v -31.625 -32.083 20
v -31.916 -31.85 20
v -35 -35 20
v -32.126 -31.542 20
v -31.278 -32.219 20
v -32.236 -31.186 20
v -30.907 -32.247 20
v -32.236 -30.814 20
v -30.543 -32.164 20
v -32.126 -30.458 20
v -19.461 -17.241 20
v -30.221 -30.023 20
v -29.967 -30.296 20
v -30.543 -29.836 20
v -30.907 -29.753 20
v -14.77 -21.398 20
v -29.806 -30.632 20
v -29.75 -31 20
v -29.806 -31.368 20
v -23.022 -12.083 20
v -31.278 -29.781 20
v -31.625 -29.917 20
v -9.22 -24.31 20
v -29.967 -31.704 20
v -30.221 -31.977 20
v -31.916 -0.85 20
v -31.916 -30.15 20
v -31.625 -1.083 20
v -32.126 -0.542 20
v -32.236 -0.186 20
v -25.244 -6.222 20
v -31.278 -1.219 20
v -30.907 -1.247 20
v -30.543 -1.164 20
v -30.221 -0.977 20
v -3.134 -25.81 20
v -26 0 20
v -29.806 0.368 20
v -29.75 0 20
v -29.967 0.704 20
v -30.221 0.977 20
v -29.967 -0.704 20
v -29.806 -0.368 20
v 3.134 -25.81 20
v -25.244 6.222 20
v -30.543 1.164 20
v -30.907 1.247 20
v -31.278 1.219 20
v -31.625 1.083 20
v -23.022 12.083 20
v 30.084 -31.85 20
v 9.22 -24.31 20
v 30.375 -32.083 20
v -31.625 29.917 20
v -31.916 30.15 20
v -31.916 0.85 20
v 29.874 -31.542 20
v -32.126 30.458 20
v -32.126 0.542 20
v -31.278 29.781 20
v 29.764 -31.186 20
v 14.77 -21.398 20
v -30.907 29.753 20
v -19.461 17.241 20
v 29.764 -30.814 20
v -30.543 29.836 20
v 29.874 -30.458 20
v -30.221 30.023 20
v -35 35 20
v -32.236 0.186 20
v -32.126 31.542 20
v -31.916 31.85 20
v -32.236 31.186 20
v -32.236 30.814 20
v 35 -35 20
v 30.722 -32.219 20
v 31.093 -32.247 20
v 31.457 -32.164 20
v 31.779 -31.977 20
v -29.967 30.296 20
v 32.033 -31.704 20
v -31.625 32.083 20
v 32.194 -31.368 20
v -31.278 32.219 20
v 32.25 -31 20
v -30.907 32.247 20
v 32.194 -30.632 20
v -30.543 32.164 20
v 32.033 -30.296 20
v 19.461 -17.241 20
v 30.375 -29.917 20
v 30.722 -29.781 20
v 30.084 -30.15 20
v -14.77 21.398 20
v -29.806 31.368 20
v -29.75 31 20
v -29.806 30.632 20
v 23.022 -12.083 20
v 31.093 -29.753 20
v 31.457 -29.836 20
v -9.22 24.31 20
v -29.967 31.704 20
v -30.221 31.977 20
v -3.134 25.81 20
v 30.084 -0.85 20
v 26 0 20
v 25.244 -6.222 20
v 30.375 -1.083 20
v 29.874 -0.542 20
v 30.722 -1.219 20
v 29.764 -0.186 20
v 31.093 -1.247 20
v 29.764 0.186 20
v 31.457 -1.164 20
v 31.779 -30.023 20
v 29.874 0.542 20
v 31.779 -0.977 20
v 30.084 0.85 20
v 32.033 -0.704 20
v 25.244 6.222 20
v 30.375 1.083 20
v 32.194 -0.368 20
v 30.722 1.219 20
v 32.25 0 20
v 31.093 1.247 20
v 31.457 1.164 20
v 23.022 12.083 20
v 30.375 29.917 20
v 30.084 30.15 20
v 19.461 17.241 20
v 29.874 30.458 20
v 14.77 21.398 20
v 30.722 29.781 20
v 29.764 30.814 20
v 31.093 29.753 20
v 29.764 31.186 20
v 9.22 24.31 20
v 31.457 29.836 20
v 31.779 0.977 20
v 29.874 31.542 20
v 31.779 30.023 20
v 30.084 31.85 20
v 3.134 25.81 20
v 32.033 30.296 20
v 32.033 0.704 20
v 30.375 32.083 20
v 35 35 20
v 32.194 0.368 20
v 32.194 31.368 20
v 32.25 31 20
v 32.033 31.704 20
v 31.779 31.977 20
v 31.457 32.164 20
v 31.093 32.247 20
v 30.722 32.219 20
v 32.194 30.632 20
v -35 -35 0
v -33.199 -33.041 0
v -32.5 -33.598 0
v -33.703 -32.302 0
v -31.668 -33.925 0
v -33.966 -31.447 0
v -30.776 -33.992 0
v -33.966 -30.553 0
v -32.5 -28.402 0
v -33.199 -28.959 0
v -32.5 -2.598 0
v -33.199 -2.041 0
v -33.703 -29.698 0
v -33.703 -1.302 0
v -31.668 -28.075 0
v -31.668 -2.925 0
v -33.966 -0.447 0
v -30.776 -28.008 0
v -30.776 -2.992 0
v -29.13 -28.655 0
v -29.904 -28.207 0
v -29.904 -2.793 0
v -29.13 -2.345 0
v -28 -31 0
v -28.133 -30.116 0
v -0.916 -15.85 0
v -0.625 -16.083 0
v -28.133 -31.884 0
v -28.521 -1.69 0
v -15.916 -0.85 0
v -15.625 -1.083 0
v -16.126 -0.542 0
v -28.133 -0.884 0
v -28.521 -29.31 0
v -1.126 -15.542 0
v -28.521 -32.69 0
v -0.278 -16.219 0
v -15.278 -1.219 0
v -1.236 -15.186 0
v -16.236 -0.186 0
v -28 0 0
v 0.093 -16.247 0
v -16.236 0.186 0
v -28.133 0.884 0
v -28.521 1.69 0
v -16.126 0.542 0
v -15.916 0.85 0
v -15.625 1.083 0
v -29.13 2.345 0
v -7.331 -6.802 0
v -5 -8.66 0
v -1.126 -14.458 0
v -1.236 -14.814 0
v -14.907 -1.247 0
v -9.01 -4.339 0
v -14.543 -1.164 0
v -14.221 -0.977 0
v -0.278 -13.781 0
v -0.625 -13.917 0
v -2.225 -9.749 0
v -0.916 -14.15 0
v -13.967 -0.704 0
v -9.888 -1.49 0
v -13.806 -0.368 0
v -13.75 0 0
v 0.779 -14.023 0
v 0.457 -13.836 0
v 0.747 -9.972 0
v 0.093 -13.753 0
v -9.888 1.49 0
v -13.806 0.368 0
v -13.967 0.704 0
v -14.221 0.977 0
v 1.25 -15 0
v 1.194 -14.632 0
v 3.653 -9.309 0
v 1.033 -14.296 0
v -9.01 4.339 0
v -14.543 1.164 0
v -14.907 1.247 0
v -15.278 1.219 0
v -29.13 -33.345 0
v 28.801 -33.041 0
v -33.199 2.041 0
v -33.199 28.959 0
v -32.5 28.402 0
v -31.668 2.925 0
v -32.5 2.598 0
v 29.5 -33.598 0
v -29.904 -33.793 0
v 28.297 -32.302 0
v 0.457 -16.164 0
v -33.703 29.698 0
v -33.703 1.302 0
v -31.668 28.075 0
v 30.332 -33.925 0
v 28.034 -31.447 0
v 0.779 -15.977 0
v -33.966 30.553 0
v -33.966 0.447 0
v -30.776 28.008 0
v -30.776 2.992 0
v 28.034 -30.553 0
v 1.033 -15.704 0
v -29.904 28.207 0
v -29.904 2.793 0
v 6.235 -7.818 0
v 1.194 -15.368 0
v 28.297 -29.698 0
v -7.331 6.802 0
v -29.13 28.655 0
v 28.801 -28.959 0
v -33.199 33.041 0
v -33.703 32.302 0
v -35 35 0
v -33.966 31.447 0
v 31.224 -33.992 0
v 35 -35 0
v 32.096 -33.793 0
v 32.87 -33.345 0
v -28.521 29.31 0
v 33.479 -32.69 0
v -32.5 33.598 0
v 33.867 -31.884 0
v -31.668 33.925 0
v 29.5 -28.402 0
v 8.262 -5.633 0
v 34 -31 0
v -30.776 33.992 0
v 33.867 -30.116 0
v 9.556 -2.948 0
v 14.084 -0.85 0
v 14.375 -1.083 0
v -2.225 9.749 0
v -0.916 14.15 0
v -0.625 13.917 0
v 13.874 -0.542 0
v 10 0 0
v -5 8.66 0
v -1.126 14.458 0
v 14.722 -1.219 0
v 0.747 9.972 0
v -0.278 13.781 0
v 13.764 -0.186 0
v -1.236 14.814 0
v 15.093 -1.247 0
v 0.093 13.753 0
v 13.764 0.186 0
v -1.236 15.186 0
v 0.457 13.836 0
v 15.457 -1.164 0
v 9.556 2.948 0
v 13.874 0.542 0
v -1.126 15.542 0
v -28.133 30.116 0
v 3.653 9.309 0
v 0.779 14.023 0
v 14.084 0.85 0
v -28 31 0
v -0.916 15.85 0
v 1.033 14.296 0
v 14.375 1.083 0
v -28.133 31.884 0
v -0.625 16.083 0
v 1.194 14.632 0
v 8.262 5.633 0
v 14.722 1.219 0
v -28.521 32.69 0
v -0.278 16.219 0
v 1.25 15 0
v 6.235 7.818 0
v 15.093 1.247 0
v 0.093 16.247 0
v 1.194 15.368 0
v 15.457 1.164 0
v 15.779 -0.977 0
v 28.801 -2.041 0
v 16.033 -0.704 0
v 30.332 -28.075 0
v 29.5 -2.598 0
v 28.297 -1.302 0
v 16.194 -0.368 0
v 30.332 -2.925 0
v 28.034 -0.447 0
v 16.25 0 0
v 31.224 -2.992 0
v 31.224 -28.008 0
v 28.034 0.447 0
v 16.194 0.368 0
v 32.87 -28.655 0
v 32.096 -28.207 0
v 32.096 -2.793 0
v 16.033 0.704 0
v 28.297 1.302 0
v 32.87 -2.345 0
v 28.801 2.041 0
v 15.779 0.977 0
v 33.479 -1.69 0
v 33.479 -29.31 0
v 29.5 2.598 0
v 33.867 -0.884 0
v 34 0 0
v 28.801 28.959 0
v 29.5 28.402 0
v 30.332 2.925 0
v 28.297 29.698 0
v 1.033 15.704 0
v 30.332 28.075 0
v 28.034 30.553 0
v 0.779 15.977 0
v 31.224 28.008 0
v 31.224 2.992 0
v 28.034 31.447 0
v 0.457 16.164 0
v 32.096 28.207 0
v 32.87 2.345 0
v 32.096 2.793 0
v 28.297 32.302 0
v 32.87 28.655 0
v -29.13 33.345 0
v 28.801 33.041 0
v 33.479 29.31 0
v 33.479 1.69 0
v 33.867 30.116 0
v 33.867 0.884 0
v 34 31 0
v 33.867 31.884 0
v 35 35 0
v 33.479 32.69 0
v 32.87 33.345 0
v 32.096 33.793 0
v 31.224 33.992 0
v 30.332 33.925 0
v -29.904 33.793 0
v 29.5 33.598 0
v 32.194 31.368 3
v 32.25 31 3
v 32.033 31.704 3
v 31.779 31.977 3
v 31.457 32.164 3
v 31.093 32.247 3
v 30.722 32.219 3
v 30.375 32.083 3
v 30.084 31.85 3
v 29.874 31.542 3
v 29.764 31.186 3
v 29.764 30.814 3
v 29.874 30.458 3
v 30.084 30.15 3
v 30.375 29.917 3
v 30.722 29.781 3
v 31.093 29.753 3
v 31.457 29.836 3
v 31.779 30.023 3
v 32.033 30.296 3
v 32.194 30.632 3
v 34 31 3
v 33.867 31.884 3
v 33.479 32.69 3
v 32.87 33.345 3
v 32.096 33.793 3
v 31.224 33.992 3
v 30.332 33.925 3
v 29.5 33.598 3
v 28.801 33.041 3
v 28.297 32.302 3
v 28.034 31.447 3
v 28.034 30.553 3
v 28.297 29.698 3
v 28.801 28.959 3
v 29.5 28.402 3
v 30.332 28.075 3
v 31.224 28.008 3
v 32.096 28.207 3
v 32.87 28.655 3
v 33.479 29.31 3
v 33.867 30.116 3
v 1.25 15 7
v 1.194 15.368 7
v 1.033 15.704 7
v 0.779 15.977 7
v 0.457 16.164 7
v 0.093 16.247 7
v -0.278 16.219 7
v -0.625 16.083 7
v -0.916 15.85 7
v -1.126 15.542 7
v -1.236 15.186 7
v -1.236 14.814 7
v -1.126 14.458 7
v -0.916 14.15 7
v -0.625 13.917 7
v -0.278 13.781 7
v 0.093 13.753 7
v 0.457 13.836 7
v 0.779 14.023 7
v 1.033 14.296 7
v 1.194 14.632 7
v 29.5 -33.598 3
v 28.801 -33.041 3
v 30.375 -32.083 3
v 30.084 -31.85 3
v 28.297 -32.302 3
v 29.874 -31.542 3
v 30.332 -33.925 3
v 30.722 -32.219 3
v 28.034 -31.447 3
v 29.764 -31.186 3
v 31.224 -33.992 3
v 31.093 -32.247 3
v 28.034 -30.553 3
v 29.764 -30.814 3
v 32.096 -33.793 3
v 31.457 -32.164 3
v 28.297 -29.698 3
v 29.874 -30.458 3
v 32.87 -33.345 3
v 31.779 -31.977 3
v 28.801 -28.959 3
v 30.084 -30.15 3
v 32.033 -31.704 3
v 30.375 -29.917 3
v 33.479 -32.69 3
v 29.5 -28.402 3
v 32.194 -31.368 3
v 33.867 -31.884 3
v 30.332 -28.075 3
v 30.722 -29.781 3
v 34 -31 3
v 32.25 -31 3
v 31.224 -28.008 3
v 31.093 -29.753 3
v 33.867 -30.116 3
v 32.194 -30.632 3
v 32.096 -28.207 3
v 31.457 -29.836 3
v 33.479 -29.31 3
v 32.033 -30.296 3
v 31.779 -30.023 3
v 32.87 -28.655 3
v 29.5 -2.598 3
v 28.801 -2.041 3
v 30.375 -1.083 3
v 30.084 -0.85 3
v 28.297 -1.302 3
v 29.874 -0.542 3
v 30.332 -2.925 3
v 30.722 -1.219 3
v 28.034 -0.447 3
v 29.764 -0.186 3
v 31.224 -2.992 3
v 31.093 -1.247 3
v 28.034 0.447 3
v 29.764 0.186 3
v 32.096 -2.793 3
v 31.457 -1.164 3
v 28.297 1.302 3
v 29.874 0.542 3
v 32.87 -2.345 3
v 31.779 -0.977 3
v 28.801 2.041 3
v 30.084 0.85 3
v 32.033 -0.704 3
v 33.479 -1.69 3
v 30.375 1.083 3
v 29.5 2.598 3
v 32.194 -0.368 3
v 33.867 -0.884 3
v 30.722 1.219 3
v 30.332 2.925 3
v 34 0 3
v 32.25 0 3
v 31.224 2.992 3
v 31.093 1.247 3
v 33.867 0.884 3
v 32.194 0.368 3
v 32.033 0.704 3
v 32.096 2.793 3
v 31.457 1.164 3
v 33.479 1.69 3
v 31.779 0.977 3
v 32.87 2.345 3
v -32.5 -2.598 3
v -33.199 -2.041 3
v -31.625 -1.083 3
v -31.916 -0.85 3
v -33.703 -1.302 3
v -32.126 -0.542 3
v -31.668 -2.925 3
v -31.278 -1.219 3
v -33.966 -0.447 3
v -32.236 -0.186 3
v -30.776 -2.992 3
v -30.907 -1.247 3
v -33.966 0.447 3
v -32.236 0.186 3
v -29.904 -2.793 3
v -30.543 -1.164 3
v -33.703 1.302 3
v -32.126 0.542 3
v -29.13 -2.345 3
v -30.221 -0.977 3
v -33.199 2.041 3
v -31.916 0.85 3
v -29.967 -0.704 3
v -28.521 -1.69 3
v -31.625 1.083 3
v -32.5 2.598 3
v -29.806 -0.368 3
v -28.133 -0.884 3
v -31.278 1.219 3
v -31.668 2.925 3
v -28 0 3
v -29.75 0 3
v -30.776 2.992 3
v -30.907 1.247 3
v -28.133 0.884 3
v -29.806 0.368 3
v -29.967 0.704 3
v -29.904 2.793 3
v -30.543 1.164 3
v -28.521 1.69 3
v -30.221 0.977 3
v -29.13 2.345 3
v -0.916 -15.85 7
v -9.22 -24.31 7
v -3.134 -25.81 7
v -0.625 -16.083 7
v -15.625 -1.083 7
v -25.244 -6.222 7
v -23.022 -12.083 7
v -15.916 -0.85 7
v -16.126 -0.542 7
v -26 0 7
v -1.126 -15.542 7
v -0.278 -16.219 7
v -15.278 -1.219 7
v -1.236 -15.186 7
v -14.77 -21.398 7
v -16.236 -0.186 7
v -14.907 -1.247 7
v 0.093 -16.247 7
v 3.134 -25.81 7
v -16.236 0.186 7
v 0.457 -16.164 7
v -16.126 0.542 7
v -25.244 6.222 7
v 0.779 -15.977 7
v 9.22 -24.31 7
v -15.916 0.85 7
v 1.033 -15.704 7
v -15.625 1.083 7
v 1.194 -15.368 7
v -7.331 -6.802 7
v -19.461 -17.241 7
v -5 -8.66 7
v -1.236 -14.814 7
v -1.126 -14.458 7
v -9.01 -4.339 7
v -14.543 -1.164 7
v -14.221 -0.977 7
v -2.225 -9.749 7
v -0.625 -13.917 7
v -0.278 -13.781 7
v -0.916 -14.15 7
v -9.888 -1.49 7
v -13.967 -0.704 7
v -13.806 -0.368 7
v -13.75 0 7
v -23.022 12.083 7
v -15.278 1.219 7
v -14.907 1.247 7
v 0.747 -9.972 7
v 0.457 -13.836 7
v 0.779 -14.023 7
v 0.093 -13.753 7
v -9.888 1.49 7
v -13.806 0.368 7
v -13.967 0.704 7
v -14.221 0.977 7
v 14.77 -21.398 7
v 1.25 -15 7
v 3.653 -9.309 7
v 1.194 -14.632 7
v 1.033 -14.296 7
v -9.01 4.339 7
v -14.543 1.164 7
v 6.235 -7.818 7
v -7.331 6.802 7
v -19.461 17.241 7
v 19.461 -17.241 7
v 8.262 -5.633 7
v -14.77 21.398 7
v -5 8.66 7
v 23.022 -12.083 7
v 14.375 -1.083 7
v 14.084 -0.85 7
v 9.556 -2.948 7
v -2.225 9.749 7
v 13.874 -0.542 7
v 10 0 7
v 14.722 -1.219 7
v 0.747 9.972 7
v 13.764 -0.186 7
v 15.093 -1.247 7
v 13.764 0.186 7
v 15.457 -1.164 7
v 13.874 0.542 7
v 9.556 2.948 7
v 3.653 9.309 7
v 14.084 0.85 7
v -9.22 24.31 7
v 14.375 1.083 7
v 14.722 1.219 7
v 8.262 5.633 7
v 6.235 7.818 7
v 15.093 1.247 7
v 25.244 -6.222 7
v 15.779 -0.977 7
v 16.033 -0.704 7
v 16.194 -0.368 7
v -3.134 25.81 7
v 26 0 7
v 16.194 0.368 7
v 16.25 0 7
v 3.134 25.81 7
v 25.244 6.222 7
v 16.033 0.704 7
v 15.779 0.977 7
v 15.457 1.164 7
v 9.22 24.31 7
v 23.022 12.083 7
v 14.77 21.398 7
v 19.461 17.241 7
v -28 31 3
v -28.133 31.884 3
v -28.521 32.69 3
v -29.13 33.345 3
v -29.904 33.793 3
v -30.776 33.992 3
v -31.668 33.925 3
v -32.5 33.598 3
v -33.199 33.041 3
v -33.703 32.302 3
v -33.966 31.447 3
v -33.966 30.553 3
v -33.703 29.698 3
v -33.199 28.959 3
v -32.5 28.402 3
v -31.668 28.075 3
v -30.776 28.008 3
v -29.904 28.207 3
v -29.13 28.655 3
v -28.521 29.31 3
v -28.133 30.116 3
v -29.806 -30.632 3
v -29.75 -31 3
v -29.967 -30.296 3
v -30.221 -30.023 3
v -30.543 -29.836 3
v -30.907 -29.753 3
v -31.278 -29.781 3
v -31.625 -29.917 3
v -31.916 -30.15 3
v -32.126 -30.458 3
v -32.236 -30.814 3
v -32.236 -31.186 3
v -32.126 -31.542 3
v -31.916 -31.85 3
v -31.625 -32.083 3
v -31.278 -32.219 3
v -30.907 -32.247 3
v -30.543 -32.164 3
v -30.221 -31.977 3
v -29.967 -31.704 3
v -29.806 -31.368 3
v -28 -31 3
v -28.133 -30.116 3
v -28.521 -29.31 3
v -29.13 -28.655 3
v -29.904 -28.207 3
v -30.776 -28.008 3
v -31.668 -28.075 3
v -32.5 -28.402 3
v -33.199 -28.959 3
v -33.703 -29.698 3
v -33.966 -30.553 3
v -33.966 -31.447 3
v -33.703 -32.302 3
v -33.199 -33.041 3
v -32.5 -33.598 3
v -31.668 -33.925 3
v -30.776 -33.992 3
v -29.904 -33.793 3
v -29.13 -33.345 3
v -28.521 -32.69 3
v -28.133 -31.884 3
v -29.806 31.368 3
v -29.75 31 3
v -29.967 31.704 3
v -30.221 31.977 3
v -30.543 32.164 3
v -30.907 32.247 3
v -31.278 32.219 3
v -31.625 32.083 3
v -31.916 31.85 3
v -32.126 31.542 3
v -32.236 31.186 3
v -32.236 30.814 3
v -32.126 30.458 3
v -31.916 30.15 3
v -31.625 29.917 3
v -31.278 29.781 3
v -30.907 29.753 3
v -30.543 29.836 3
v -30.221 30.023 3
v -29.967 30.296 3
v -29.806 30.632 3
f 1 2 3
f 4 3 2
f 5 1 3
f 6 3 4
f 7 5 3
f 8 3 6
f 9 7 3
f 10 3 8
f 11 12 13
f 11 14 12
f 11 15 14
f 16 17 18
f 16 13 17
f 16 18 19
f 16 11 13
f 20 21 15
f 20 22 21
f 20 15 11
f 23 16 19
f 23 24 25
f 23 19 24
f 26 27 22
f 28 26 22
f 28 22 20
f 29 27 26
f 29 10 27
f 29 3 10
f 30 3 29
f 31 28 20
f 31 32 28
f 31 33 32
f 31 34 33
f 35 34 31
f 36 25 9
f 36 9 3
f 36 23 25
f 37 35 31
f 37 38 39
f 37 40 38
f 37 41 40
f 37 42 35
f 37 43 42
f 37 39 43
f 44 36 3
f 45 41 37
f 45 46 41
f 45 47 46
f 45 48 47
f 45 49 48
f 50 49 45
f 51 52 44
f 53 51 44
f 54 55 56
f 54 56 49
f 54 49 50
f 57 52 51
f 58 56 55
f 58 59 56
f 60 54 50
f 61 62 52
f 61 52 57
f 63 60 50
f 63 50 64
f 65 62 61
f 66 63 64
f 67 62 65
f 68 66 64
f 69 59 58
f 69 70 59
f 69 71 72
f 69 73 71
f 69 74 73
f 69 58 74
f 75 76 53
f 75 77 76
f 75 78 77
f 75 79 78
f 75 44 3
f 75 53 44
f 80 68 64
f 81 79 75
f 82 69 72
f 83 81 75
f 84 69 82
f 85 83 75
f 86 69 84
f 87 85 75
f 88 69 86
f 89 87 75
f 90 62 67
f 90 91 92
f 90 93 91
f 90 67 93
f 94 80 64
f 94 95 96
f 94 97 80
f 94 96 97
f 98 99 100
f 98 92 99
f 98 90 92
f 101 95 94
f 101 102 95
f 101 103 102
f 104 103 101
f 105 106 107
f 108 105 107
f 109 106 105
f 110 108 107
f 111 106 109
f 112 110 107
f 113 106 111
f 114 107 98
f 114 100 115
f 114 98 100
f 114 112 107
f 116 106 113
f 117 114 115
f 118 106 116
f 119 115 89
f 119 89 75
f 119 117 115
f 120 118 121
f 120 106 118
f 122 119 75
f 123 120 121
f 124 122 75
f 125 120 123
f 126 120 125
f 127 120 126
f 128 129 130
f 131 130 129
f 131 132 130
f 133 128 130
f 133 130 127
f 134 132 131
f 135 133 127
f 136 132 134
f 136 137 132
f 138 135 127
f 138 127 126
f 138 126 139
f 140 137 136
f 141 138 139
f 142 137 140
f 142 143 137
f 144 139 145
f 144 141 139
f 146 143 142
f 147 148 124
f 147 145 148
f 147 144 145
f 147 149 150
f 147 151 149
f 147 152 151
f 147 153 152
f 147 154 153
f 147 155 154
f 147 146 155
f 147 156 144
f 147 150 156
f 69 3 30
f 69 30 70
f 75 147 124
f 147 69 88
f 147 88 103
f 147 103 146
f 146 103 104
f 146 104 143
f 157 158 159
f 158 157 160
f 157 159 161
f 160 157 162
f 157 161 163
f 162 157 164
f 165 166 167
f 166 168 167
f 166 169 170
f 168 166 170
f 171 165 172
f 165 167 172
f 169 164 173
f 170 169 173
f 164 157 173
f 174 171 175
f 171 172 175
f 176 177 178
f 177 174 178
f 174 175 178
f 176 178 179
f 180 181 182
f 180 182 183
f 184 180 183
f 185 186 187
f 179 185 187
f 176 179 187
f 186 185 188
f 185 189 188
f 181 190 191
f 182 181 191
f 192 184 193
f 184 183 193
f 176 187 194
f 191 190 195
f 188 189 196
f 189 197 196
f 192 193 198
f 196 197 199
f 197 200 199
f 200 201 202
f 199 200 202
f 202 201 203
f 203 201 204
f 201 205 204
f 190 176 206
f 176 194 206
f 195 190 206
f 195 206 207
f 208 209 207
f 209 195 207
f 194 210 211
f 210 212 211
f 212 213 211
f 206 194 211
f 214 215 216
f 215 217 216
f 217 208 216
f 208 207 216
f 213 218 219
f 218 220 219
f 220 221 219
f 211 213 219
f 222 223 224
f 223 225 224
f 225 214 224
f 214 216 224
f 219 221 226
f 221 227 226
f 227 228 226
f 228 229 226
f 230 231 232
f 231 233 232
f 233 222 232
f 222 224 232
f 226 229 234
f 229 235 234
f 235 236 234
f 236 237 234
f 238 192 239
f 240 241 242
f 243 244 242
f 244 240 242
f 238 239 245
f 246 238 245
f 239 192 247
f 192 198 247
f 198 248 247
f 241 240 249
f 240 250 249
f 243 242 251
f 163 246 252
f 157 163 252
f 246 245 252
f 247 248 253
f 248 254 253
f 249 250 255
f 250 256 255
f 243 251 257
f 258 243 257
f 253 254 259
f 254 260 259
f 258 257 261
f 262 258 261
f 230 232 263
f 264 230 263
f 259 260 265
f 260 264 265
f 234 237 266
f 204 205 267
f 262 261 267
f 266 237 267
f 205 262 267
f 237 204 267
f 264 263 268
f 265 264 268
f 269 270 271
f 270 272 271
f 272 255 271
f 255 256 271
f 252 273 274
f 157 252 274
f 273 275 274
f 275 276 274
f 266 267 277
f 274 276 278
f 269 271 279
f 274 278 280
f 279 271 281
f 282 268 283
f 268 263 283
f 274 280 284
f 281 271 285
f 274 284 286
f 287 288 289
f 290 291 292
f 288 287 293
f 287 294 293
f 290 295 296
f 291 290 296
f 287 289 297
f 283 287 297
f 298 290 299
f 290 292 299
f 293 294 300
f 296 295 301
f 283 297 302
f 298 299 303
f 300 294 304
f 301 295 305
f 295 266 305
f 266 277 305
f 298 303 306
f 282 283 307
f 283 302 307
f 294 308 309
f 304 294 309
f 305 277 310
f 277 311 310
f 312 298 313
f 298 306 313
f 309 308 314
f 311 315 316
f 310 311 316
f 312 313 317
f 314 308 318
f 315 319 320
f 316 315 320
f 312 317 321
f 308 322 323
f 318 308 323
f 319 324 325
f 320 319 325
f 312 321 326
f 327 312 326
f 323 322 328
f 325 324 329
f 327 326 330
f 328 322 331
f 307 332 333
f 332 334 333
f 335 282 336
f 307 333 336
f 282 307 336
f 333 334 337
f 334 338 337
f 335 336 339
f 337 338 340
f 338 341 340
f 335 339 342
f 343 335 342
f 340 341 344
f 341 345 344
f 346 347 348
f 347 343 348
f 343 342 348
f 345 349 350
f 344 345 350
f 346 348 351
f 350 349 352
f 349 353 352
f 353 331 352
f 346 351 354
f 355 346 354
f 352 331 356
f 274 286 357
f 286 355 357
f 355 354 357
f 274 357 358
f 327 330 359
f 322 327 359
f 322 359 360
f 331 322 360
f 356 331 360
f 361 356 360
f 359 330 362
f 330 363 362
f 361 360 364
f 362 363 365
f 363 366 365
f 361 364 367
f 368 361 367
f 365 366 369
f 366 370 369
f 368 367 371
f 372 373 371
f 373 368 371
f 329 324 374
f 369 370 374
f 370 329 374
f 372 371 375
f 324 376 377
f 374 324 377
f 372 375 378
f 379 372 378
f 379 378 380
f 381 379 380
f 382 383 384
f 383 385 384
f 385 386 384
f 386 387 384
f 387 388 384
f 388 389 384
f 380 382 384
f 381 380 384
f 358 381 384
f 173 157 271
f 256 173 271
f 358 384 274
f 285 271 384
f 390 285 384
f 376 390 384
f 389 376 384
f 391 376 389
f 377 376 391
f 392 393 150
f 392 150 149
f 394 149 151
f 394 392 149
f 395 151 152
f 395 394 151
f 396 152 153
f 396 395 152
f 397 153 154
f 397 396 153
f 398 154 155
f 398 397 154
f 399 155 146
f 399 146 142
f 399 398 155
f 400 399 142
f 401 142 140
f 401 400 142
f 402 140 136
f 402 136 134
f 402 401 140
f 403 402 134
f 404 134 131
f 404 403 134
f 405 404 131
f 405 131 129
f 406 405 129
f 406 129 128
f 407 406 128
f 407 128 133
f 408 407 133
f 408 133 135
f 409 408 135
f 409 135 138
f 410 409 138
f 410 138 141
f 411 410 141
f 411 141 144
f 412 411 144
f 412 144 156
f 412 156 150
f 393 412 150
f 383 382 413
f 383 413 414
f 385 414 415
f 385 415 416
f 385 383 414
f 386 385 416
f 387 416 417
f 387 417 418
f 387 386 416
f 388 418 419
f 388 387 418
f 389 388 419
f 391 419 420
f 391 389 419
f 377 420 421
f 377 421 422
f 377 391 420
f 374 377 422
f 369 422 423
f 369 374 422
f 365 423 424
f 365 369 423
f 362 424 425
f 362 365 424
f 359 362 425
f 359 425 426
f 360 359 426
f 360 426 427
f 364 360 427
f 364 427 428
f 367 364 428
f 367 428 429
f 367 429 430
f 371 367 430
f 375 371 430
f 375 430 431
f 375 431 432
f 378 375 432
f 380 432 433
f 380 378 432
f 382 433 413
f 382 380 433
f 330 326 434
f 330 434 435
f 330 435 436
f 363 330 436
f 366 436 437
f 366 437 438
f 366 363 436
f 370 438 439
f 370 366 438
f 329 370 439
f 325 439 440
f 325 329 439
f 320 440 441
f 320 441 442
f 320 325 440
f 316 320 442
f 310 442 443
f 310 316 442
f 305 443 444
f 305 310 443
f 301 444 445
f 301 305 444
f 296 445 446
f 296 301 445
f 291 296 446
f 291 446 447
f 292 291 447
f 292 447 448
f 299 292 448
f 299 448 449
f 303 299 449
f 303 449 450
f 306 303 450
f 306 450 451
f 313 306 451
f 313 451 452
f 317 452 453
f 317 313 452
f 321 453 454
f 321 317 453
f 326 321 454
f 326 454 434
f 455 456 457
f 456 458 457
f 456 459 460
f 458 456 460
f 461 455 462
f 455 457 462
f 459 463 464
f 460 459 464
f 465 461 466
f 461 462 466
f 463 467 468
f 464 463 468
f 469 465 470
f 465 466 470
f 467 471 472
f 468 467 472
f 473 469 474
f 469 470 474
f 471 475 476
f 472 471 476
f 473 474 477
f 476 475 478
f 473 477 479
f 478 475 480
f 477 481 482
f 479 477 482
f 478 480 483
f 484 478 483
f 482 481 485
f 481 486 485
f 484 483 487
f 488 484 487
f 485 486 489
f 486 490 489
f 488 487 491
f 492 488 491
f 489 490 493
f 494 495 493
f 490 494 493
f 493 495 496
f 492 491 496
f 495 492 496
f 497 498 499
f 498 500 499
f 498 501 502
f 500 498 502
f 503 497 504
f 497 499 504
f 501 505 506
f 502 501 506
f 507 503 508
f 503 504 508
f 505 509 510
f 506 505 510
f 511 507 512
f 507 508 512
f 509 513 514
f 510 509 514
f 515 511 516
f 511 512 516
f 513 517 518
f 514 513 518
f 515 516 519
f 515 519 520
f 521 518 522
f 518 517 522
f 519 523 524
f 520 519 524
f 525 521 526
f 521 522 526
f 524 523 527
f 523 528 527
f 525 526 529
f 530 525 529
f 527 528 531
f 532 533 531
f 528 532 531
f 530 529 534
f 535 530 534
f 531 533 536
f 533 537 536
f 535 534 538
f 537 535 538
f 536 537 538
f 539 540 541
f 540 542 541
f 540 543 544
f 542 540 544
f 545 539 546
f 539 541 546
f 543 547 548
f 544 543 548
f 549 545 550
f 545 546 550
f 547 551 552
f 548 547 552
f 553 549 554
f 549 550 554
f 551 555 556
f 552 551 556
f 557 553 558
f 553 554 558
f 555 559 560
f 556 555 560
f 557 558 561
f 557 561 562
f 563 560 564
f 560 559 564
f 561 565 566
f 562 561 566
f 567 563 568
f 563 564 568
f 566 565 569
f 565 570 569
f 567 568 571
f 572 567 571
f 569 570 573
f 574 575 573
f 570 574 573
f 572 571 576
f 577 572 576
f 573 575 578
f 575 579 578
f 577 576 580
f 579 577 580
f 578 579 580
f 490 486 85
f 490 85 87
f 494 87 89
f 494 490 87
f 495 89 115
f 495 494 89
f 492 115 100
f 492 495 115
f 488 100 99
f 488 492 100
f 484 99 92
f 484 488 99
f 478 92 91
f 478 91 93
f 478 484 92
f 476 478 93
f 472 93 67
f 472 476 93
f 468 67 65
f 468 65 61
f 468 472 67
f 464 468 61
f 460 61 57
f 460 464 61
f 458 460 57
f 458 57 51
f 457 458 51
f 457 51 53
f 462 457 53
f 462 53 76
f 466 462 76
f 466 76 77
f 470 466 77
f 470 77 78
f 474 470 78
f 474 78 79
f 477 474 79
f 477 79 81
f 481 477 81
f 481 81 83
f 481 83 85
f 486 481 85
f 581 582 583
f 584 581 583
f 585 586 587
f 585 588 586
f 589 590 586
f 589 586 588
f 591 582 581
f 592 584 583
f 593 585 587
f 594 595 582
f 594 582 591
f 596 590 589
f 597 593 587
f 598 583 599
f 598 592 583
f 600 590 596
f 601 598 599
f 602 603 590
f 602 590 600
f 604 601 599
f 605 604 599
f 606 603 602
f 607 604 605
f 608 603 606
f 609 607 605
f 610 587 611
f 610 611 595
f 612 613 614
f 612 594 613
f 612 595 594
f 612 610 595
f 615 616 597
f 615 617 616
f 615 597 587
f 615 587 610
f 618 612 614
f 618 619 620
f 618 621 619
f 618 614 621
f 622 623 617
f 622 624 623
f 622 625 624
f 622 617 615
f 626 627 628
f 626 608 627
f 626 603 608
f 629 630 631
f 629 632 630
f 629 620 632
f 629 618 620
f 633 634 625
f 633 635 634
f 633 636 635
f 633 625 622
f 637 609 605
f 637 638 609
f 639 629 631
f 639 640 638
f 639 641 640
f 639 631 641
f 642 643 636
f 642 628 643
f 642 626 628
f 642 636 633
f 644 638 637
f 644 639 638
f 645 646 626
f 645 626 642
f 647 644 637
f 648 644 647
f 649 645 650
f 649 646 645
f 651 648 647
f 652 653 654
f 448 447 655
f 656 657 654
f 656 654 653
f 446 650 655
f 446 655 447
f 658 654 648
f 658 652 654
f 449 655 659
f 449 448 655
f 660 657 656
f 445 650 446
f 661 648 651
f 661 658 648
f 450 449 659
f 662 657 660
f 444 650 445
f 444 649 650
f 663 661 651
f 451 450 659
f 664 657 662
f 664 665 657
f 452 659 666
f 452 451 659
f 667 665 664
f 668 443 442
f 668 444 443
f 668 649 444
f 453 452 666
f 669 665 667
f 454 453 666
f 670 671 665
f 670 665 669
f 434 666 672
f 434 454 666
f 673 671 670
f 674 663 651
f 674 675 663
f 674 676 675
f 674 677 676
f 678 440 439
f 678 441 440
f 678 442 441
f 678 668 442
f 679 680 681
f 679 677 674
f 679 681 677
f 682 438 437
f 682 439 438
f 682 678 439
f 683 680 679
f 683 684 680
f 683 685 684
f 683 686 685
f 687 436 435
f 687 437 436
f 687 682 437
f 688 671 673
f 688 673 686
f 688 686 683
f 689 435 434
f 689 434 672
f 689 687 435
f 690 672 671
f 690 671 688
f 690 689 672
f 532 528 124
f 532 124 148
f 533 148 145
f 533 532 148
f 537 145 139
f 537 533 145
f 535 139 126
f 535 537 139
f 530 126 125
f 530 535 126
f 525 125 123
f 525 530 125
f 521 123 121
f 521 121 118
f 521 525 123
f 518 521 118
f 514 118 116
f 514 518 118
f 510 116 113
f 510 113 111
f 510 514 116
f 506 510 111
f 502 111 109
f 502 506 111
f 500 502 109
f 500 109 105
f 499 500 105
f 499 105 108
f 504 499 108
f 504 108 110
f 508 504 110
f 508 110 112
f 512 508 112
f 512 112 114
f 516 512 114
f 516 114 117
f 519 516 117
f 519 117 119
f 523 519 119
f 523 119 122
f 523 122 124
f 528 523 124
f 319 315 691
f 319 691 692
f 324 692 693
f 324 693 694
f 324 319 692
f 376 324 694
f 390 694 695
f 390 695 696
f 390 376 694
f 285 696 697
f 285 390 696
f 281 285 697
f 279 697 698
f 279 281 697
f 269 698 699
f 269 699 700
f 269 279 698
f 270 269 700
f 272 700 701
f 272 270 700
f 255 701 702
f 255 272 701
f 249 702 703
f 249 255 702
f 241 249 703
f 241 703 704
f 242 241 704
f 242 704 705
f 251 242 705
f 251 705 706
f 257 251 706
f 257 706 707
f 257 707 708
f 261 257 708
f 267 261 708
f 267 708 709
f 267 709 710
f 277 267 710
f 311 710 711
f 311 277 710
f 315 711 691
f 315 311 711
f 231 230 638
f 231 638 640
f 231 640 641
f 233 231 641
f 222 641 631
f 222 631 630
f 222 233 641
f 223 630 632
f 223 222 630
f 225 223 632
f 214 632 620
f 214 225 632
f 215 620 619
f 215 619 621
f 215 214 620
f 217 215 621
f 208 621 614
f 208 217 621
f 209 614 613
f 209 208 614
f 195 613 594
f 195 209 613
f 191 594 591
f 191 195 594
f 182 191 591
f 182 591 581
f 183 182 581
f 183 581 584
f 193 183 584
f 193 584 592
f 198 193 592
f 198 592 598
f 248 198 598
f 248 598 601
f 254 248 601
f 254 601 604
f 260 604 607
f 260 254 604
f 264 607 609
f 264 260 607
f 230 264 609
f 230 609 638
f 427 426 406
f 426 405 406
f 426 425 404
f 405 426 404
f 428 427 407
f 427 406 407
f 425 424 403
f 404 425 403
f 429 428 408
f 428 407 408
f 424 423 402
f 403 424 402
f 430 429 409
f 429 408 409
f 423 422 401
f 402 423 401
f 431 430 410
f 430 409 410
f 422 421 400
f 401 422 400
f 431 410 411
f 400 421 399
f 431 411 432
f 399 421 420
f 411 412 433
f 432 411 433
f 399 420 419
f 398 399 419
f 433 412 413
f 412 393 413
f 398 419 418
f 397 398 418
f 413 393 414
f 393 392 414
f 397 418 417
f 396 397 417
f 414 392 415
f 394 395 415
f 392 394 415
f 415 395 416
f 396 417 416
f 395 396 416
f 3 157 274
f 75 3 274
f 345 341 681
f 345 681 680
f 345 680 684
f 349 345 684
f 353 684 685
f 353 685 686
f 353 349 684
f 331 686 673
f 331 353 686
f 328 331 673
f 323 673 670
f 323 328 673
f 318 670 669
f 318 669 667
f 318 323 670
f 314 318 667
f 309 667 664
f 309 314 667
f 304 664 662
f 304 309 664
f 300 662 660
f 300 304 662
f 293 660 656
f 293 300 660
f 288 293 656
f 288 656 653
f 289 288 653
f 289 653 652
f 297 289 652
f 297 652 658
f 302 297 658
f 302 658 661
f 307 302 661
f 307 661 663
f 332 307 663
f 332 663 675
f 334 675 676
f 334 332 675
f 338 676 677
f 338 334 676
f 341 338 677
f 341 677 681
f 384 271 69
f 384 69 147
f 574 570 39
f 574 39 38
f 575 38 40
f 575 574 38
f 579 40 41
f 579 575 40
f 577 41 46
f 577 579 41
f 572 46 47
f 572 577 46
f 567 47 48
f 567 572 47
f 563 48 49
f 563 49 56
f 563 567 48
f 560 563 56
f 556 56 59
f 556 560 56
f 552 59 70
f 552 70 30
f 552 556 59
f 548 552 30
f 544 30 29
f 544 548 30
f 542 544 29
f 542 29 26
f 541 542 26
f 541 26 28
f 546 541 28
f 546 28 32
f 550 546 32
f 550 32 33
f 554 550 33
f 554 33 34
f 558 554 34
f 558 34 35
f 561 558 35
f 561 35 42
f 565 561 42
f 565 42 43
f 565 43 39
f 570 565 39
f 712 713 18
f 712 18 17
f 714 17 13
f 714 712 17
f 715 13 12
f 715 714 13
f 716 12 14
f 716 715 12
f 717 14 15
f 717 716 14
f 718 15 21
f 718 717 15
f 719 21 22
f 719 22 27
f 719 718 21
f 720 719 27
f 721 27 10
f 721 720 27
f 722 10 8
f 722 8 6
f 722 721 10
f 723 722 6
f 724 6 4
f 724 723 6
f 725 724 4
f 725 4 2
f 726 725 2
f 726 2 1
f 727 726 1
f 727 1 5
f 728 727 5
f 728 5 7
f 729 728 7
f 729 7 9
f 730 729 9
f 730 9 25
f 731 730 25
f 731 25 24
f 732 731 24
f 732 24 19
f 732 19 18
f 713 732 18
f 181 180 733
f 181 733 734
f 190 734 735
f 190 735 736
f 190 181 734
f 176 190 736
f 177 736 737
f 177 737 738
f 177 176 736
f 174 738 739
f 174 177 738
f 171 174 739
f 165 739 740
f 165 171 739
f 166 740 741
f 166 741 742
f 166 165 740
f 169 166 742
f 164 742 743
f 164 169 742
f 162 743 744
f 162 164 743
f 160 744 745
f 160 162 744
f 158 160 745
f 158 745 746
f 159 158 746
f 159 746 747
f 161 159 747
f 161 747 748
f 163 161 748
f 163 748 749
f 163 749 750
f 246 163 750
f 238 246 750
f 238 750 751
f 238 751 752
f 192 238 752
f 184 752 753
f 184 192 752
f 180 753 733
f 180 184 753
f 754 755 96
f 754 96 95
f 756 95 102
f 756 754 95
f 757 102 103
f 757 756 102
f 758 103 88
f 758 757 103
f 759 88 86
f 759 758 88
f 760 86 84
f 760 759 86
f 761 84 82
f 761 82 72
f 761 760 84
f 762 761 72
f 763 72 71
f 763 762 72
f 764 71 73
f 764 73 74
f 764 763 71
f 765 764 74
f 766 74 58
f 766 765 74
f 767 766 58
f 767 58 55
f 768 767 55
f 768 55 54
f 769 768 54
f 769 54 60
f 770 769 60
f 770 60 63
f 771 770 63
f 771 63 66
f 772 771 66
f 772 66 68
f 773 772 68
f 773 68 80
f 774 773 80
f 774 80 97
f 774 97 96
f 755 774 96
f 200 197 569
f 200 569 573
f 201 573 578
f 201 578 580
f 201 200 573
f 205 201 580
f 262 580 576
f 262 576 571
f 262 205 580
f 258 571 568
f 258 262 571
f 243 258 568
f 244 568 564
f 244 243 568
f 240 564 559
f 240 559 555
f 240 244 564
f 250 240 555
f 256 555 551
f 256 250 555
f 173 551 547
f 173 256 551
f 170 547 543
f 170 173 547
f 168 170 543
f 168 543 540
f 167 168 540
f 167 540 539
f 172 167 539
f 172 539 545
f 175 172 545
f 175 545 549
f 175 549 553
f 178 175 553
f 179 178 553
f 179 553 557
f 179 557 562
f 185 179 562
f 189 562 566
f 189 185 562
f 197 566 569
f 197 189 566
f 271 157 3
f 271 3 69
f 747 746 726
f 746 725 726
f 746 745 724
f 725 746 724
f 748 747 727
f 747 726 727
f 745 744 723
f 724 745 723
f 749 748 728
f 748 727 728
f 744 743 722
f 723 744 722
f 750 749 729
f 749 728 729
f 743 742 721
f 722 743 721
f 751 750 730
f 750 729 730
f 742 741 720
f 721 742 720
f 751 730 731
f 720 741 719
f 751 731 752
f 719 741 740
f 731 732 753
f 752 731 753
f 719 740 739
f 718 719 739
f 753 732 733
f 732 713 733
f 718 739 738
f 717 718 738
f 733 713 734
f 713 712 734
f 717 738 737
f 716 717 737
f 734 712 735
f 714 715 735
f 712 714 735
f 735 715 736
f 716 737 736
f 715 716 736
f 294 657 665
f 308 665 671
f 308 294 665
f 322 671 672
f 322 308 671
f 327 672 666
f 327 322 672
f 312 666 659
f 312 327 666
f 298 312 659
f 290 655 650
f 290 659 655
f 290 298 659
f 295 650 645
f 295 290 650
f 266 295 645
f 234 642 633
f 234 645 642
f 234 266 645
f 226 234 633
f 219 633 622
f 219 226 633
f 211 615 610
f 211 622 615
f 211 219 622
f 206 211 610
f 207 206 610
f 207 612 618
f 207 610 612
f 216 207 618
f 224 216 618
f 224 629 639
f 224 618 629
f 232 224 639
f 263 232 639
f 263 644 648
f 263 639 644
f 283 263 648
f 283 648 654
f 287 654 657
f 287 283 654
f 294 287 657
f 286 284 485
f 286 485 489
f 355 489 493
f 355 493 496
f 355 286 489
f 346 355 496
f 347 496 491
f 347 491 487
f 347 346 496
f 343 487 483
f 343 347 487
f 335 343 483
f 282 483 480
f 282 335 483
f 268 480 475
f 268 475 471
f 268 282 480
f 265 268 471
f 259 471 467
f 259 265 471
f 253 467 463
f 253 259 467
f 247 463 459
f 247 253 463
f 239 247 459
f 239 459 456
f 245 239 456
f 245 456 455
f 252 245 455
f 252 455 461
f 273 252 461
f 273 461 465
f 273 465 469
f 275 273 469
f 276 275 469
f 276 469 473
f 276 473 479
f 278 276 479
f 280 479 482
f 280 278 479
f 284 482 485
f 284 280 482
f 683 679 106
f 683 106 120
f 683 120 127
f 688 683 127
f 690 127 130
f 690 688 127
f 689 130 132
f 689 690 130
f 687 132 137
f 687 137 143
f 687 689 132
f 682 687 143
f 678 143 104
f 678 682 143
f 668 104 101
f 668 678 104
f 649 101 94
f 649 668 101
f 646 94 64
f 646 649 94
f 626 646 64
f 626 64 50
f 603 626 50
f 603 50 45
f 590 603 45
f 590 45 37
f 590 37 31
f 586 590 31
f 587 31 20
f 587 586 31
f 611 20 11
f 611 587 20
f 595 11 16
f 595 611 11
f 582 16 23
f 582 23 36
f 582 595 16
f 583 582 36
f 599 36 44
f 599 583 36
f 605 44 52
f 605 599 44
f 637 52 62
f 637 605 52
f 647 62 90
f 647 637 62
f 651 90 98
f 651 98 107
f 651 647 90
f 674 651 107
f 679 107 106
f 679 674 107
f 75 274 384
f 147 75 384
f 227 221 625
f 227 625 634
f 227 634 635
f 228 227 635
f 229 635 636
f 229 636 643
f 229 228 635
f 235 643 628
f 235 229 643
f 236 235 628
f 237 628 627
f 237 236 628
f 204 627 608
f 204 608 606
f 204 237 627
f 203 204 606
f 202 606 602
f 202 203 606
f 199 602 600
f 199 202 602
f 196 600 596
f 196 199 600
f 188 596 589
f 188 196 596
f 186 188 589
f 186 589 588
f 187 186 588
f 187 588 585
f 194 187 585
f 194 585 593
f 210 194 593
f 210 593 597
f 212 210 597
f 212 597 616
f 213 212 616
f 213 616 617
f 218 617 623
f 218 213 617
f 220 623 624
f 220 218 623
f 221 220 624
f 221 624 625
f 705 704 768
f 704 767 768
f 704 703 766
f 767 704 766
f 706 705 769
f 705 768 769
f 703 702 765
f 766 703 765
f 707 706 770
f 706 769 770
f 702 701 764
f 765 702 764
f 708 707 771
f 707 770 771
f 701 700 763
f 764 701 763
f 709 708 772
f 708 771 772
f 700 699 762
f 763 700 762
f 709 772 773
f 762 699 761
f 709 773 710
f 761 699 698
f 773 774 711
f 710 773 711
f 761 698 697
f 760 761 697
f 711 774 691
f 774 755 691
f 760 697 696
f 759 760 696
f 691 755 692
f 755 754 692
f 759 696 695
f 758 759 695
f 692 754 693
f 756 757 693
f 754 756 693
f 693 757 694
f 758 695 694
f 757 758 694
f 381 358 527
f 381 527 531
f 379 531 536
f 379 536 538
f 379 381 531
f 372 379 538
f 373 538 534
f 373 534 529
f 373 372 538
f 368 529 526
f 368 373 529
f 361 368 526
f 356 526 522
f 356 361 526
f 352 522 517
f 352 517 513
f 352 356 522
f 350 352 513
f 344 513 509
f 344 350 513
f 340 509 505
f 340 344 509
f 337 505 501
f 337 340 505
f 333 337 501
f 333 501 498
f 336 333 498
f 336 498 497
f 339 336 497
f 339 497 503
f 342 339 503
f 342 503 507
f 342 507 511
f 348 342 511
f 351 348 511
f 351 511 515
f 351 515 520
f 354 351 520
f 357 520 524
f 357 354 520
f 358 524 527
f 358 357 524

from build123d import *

# Parameters (mm, degrees)
CYLINDER009_R     = 1.25
CYLINDER009_DEPTH = 20
CYLINDER010_R     = 1.25
CYLINDER010_DEPTH = 20
CYLINDER008_R     = 1.25
CYLINDER008_DEPTH = 20
CYLINDER011_R     = 1.25
CYLINDER011_DEPTH = 20
CYLINDER007_R     = 1.25
CYLINDER007_DEPTH = 20
CYLINDER006_R     = 1.25
CYLINDER006_DEPTH = 20
CYLINDER013_R     = 3
CYLINDER013_DEPTH = 3
CYLINDER017_R     = 3
CYLINDER017_DEPTH = 3
CYLINDER014_R     = 3
CYLINDER014_DEPTH = 3
CYLINDER015_R     = 3
CYLINDER015_DEPTH = 3
CYLINDER016_R     = 3
CYLINDER016_DEPTH = 3
CYLINDER012_R     = 3
CYLINDER012_DEPTH = 3
CYLINDER003_R     = 1.25
CYLINDER003_DEPTH = 7
CYLINDER005_R     = 1.25
CYLINDER005_DEPTH = 7
CYLINDER004_R     = 1.25
CYLINDER004_DEPTH = 7
CYLINDER002_R     = 1.25
CYLINDER002_DEPTH = 7
CYLINDER001_R     = 26
CYLINDER001_DEPTH = 13
CYLINDER_R        = 10
CYLINDER_DEPTH    = 20
BOX_W             = 70
BOX_H             = 70
BOX_DEPTH         = 20


with BuildPart() as zylinder009:
    # Cylinder009 → Cylinder009 (new body)
    with BuildSketch(Plane(origin=(-31, 31, 0), x_dir=(1, 0, 0), z_dir=(0, 0, 1))):
        Circle(CYLINDER009_R)
    extrude(amount=CYLINDER009_DEPTH)


with BuildPart() as zylinder010:
    # Cylinder010 → Cylinder010 (new body)
    with BuildSketch(Plane(origin=(-31, -31, 0), x_dir=(1, 0, 0), z_dir=(0, 0, 1))):
        Circle(CYLINDER010_R)
    extrude(amount=CYLINDER010_DEPTH)


with BuildPart() as zylinder008:
    # Cylinder008 → Cylinder008 (new body)
    with BuildSketch(Plane(origin=(31, -31, 0), x_dir=(1, 0, 0), z_dir=(0, 0, 1))):
        Circle(CYLINDER008_R)
    extrude(amount=CYLINDER008_DEPTH)


with BuildPart() as zylinder011:
    # Cylinder011 → Cylinder011 (new body)
    with BuildSketch(Plane(origin=(-31, 0, 0), x_dir=(1, 0, 0), z_dir=(0, 0, 1))):
        Circle(CYLINDER011_R)
    extrude(amount=CYLINDER011_DEPTH)


with BuildPart() as zylinder007:
    # Cylinder007 → Cylinder007 (new body)
    with BuildSketch(Plane(origin=(31, 0, 0), x_dir=(1, 0, 0), z_dir=(0, 0, 1))):
        Circle(CYLINDER007_R)
    extrude(amount=CYLINDER007_DEPTH)


with BuildPart() as fusion002:
    # Cylinder006 → Cylinder006 (new body)
    with BuildSketch(Plane(origin=(31, 31, 0), x_dir=(1, 0, 0), z_dir=(0, 0, 1))):
        Circle(CYLINDER006_R)
    extrude(amount=CYLINDER006_DEPTH)

    # Fusion002: union Zylinder009, Zylinder010, Zylinder008, Zylinder011, Zylinder007
    add(zylinder009.part)
    add(zylinder010.part)
    add(zylinder008.part)
    add(zylinder011.part)
    add(zylinder007.part)


with BuildPart() as zylinder013:
    # Cylinder013 → Cylinder013 (new body)
    with BuildSketch(Plane(origin=(-31, 31, 0), x_dir=(1, 0, 0), z_dir=(0, 0, 1))):
        Circle(CYLINDER013_R)
    extrude(amount=CYLINDER013_DEPTH)


with BuildPart() as zylinder017:
    # Cylinder017 → Cylinder017 (new body)
    with BuildSketch(Plane(origin=(-31, 0, 0), x_dir=(1, 0, 0), z_dir=(0, 0, 1))):
        Circle(CYLINDER017_R)
    extrude(amount=CYLINDER017_DEPTH)


with BuildPart() as zylinder014:
    # Cylinder014 → Cylinder014 (new body)
    with BuildSketch(Plane(origin=(-31, -31, 0), x_dir=(1, 0, 0), z_dir=(0, 0, 1))):
        Circle(CYLINDER014_R)
    extrude(amount=CYLINDER014_DEPTH)


with BuildPart() as zylinder015:
    # Cylinder015 → Cylinder015 (new body)
    with BuildSketch(Plane(origin=(31, -31, 0), x_dir=(1, 0, 0), z_dir=(0, 0, 1))):
        Circle(CYLINDER015_R)
    extrude(amount=CYLINDER015_DEPTH)


with BuildPart() as zylinder016:
    # Cylinder016 → Cylinder016 (new body)
    with BuildSketch(Plane(origin=(31, 0, 0), x_dir=(1, 0, 0), z_dir=(0, 0, 1))):
        Circle(CYLINDER016_R)
    extrude(amount=CYLINDER016_DEPTH)


with BuildPart() as fusion003:
    # Cylinder012 → Cylinder012 (new body)
    with BuildSketch(Plane(origin=(31, 31, 0), x_dir=(1, 0, 0), z_dir=(0, 0, 1))):
        Circle(CYLINDER012_R)
    extrude(amount=CYLINDER012_DEPTH)

    # Fusion001: union Zylinder013, Zylinder017, Zylinder014, Zylinder015, Zylinder016
    add(zylinder013.part)
    add(zylinder017.part)
    add(zylinder014.part)
    add(zylinder015.part)
    add(zylinder016.part)

    # Fusion003: union Fusion002
    add(fusion002.part)


with BuildPart() as zylinder003:
    # Cylinder003 → Cylinder003 (new body)
    with BuildSketch(Plane(origin=(-15, 0, 0), x_dir=(1, 0, 0), z_dir=(0, 0, 1))):
        Circle(CYLINDER003_R)
    extrude(amount=CYLINDER003_DEPTH)


with BuildPart() as zylinder005:
    # Cylinder005 → Cylinder005 (new body)
    with BuildSketch(Plane(origin=(0, -15, 0), x_dir=(1, 0, 0), z_dir=(0, 0, 1))):
        Circle(CYLINDER005_R)
    extrude(amount=CYLINDER005_DEPTH)


with BuildPart() as zylinder004:
    # Cylinder004 → Cylinder004 (new body)
    with BuildSketch(Plane(origin=(0, 15, 0), x_dir=(1, 0, 0), z_dir=(0, 0, 1))):
        Circle(CYLINDER004_R)
    extrude(amount=CYLINDER004_DEPTH)


with BuildPart() as fusion:
    # Cylinder002 → Cylinder002 (new body)
    with BuildSketch(Plane(origin=(15, 0, 0), x_dir=(1, 0, 0), z_dir=(0, 0, 1))):
        Circle(CYLINDER002_R)
    extrude(amount=CYLINDER002_DEPTH)

    # Fusion: union Zylinder003, Zylinder005, Zylinder004
    add(zylinder003.part)
    add(zylinder005.part)
    add(zylinder004.part)


with BuildPart() as zylinder001:
    # Cylinder001 → Cylinder001 (new body)
    with BuildSketch(Plane.XY.offset(7)):
        Circle(CYLINDER001_R)
    extrude(amount=CYLINDER001_DEPTH)


with BuildPart() as zylinder:
    # Cylinder → Cylinder (new body)
    with BuildSketch(Plane.XY):
        Circle(CYLINDER_R)
    extrude(amount=CYLINDER_DEPTH)


with BuildPart() as cut003:
    # Box → Box (new body)
    with BuildSketch(Plane(origin=(-35, -35, 0), x_dir=(1, 0, 0), z_dir=(0, 0, 1))):
        with Locations((35, 35)):
            Rectangle(BOX_W, BOX_H)
    extrude(amount=BOX_DEPTH)

    # Cut: cut Zylinder
    add(zylinder.part, mode=Mode.SUBTRACT)

    # Cut001: cut Zylinder001
    add(zylinder001.part, mode=Mode.SUBTRACT)

    # Cut002: cut Fusion
    add(fusion.part, mode=Mode.SUBTRACT)

    # Cut003: cut Fusion003
    add(fusion003.part, mode=Mode.SUBTRACT)


solid = cut003.part
